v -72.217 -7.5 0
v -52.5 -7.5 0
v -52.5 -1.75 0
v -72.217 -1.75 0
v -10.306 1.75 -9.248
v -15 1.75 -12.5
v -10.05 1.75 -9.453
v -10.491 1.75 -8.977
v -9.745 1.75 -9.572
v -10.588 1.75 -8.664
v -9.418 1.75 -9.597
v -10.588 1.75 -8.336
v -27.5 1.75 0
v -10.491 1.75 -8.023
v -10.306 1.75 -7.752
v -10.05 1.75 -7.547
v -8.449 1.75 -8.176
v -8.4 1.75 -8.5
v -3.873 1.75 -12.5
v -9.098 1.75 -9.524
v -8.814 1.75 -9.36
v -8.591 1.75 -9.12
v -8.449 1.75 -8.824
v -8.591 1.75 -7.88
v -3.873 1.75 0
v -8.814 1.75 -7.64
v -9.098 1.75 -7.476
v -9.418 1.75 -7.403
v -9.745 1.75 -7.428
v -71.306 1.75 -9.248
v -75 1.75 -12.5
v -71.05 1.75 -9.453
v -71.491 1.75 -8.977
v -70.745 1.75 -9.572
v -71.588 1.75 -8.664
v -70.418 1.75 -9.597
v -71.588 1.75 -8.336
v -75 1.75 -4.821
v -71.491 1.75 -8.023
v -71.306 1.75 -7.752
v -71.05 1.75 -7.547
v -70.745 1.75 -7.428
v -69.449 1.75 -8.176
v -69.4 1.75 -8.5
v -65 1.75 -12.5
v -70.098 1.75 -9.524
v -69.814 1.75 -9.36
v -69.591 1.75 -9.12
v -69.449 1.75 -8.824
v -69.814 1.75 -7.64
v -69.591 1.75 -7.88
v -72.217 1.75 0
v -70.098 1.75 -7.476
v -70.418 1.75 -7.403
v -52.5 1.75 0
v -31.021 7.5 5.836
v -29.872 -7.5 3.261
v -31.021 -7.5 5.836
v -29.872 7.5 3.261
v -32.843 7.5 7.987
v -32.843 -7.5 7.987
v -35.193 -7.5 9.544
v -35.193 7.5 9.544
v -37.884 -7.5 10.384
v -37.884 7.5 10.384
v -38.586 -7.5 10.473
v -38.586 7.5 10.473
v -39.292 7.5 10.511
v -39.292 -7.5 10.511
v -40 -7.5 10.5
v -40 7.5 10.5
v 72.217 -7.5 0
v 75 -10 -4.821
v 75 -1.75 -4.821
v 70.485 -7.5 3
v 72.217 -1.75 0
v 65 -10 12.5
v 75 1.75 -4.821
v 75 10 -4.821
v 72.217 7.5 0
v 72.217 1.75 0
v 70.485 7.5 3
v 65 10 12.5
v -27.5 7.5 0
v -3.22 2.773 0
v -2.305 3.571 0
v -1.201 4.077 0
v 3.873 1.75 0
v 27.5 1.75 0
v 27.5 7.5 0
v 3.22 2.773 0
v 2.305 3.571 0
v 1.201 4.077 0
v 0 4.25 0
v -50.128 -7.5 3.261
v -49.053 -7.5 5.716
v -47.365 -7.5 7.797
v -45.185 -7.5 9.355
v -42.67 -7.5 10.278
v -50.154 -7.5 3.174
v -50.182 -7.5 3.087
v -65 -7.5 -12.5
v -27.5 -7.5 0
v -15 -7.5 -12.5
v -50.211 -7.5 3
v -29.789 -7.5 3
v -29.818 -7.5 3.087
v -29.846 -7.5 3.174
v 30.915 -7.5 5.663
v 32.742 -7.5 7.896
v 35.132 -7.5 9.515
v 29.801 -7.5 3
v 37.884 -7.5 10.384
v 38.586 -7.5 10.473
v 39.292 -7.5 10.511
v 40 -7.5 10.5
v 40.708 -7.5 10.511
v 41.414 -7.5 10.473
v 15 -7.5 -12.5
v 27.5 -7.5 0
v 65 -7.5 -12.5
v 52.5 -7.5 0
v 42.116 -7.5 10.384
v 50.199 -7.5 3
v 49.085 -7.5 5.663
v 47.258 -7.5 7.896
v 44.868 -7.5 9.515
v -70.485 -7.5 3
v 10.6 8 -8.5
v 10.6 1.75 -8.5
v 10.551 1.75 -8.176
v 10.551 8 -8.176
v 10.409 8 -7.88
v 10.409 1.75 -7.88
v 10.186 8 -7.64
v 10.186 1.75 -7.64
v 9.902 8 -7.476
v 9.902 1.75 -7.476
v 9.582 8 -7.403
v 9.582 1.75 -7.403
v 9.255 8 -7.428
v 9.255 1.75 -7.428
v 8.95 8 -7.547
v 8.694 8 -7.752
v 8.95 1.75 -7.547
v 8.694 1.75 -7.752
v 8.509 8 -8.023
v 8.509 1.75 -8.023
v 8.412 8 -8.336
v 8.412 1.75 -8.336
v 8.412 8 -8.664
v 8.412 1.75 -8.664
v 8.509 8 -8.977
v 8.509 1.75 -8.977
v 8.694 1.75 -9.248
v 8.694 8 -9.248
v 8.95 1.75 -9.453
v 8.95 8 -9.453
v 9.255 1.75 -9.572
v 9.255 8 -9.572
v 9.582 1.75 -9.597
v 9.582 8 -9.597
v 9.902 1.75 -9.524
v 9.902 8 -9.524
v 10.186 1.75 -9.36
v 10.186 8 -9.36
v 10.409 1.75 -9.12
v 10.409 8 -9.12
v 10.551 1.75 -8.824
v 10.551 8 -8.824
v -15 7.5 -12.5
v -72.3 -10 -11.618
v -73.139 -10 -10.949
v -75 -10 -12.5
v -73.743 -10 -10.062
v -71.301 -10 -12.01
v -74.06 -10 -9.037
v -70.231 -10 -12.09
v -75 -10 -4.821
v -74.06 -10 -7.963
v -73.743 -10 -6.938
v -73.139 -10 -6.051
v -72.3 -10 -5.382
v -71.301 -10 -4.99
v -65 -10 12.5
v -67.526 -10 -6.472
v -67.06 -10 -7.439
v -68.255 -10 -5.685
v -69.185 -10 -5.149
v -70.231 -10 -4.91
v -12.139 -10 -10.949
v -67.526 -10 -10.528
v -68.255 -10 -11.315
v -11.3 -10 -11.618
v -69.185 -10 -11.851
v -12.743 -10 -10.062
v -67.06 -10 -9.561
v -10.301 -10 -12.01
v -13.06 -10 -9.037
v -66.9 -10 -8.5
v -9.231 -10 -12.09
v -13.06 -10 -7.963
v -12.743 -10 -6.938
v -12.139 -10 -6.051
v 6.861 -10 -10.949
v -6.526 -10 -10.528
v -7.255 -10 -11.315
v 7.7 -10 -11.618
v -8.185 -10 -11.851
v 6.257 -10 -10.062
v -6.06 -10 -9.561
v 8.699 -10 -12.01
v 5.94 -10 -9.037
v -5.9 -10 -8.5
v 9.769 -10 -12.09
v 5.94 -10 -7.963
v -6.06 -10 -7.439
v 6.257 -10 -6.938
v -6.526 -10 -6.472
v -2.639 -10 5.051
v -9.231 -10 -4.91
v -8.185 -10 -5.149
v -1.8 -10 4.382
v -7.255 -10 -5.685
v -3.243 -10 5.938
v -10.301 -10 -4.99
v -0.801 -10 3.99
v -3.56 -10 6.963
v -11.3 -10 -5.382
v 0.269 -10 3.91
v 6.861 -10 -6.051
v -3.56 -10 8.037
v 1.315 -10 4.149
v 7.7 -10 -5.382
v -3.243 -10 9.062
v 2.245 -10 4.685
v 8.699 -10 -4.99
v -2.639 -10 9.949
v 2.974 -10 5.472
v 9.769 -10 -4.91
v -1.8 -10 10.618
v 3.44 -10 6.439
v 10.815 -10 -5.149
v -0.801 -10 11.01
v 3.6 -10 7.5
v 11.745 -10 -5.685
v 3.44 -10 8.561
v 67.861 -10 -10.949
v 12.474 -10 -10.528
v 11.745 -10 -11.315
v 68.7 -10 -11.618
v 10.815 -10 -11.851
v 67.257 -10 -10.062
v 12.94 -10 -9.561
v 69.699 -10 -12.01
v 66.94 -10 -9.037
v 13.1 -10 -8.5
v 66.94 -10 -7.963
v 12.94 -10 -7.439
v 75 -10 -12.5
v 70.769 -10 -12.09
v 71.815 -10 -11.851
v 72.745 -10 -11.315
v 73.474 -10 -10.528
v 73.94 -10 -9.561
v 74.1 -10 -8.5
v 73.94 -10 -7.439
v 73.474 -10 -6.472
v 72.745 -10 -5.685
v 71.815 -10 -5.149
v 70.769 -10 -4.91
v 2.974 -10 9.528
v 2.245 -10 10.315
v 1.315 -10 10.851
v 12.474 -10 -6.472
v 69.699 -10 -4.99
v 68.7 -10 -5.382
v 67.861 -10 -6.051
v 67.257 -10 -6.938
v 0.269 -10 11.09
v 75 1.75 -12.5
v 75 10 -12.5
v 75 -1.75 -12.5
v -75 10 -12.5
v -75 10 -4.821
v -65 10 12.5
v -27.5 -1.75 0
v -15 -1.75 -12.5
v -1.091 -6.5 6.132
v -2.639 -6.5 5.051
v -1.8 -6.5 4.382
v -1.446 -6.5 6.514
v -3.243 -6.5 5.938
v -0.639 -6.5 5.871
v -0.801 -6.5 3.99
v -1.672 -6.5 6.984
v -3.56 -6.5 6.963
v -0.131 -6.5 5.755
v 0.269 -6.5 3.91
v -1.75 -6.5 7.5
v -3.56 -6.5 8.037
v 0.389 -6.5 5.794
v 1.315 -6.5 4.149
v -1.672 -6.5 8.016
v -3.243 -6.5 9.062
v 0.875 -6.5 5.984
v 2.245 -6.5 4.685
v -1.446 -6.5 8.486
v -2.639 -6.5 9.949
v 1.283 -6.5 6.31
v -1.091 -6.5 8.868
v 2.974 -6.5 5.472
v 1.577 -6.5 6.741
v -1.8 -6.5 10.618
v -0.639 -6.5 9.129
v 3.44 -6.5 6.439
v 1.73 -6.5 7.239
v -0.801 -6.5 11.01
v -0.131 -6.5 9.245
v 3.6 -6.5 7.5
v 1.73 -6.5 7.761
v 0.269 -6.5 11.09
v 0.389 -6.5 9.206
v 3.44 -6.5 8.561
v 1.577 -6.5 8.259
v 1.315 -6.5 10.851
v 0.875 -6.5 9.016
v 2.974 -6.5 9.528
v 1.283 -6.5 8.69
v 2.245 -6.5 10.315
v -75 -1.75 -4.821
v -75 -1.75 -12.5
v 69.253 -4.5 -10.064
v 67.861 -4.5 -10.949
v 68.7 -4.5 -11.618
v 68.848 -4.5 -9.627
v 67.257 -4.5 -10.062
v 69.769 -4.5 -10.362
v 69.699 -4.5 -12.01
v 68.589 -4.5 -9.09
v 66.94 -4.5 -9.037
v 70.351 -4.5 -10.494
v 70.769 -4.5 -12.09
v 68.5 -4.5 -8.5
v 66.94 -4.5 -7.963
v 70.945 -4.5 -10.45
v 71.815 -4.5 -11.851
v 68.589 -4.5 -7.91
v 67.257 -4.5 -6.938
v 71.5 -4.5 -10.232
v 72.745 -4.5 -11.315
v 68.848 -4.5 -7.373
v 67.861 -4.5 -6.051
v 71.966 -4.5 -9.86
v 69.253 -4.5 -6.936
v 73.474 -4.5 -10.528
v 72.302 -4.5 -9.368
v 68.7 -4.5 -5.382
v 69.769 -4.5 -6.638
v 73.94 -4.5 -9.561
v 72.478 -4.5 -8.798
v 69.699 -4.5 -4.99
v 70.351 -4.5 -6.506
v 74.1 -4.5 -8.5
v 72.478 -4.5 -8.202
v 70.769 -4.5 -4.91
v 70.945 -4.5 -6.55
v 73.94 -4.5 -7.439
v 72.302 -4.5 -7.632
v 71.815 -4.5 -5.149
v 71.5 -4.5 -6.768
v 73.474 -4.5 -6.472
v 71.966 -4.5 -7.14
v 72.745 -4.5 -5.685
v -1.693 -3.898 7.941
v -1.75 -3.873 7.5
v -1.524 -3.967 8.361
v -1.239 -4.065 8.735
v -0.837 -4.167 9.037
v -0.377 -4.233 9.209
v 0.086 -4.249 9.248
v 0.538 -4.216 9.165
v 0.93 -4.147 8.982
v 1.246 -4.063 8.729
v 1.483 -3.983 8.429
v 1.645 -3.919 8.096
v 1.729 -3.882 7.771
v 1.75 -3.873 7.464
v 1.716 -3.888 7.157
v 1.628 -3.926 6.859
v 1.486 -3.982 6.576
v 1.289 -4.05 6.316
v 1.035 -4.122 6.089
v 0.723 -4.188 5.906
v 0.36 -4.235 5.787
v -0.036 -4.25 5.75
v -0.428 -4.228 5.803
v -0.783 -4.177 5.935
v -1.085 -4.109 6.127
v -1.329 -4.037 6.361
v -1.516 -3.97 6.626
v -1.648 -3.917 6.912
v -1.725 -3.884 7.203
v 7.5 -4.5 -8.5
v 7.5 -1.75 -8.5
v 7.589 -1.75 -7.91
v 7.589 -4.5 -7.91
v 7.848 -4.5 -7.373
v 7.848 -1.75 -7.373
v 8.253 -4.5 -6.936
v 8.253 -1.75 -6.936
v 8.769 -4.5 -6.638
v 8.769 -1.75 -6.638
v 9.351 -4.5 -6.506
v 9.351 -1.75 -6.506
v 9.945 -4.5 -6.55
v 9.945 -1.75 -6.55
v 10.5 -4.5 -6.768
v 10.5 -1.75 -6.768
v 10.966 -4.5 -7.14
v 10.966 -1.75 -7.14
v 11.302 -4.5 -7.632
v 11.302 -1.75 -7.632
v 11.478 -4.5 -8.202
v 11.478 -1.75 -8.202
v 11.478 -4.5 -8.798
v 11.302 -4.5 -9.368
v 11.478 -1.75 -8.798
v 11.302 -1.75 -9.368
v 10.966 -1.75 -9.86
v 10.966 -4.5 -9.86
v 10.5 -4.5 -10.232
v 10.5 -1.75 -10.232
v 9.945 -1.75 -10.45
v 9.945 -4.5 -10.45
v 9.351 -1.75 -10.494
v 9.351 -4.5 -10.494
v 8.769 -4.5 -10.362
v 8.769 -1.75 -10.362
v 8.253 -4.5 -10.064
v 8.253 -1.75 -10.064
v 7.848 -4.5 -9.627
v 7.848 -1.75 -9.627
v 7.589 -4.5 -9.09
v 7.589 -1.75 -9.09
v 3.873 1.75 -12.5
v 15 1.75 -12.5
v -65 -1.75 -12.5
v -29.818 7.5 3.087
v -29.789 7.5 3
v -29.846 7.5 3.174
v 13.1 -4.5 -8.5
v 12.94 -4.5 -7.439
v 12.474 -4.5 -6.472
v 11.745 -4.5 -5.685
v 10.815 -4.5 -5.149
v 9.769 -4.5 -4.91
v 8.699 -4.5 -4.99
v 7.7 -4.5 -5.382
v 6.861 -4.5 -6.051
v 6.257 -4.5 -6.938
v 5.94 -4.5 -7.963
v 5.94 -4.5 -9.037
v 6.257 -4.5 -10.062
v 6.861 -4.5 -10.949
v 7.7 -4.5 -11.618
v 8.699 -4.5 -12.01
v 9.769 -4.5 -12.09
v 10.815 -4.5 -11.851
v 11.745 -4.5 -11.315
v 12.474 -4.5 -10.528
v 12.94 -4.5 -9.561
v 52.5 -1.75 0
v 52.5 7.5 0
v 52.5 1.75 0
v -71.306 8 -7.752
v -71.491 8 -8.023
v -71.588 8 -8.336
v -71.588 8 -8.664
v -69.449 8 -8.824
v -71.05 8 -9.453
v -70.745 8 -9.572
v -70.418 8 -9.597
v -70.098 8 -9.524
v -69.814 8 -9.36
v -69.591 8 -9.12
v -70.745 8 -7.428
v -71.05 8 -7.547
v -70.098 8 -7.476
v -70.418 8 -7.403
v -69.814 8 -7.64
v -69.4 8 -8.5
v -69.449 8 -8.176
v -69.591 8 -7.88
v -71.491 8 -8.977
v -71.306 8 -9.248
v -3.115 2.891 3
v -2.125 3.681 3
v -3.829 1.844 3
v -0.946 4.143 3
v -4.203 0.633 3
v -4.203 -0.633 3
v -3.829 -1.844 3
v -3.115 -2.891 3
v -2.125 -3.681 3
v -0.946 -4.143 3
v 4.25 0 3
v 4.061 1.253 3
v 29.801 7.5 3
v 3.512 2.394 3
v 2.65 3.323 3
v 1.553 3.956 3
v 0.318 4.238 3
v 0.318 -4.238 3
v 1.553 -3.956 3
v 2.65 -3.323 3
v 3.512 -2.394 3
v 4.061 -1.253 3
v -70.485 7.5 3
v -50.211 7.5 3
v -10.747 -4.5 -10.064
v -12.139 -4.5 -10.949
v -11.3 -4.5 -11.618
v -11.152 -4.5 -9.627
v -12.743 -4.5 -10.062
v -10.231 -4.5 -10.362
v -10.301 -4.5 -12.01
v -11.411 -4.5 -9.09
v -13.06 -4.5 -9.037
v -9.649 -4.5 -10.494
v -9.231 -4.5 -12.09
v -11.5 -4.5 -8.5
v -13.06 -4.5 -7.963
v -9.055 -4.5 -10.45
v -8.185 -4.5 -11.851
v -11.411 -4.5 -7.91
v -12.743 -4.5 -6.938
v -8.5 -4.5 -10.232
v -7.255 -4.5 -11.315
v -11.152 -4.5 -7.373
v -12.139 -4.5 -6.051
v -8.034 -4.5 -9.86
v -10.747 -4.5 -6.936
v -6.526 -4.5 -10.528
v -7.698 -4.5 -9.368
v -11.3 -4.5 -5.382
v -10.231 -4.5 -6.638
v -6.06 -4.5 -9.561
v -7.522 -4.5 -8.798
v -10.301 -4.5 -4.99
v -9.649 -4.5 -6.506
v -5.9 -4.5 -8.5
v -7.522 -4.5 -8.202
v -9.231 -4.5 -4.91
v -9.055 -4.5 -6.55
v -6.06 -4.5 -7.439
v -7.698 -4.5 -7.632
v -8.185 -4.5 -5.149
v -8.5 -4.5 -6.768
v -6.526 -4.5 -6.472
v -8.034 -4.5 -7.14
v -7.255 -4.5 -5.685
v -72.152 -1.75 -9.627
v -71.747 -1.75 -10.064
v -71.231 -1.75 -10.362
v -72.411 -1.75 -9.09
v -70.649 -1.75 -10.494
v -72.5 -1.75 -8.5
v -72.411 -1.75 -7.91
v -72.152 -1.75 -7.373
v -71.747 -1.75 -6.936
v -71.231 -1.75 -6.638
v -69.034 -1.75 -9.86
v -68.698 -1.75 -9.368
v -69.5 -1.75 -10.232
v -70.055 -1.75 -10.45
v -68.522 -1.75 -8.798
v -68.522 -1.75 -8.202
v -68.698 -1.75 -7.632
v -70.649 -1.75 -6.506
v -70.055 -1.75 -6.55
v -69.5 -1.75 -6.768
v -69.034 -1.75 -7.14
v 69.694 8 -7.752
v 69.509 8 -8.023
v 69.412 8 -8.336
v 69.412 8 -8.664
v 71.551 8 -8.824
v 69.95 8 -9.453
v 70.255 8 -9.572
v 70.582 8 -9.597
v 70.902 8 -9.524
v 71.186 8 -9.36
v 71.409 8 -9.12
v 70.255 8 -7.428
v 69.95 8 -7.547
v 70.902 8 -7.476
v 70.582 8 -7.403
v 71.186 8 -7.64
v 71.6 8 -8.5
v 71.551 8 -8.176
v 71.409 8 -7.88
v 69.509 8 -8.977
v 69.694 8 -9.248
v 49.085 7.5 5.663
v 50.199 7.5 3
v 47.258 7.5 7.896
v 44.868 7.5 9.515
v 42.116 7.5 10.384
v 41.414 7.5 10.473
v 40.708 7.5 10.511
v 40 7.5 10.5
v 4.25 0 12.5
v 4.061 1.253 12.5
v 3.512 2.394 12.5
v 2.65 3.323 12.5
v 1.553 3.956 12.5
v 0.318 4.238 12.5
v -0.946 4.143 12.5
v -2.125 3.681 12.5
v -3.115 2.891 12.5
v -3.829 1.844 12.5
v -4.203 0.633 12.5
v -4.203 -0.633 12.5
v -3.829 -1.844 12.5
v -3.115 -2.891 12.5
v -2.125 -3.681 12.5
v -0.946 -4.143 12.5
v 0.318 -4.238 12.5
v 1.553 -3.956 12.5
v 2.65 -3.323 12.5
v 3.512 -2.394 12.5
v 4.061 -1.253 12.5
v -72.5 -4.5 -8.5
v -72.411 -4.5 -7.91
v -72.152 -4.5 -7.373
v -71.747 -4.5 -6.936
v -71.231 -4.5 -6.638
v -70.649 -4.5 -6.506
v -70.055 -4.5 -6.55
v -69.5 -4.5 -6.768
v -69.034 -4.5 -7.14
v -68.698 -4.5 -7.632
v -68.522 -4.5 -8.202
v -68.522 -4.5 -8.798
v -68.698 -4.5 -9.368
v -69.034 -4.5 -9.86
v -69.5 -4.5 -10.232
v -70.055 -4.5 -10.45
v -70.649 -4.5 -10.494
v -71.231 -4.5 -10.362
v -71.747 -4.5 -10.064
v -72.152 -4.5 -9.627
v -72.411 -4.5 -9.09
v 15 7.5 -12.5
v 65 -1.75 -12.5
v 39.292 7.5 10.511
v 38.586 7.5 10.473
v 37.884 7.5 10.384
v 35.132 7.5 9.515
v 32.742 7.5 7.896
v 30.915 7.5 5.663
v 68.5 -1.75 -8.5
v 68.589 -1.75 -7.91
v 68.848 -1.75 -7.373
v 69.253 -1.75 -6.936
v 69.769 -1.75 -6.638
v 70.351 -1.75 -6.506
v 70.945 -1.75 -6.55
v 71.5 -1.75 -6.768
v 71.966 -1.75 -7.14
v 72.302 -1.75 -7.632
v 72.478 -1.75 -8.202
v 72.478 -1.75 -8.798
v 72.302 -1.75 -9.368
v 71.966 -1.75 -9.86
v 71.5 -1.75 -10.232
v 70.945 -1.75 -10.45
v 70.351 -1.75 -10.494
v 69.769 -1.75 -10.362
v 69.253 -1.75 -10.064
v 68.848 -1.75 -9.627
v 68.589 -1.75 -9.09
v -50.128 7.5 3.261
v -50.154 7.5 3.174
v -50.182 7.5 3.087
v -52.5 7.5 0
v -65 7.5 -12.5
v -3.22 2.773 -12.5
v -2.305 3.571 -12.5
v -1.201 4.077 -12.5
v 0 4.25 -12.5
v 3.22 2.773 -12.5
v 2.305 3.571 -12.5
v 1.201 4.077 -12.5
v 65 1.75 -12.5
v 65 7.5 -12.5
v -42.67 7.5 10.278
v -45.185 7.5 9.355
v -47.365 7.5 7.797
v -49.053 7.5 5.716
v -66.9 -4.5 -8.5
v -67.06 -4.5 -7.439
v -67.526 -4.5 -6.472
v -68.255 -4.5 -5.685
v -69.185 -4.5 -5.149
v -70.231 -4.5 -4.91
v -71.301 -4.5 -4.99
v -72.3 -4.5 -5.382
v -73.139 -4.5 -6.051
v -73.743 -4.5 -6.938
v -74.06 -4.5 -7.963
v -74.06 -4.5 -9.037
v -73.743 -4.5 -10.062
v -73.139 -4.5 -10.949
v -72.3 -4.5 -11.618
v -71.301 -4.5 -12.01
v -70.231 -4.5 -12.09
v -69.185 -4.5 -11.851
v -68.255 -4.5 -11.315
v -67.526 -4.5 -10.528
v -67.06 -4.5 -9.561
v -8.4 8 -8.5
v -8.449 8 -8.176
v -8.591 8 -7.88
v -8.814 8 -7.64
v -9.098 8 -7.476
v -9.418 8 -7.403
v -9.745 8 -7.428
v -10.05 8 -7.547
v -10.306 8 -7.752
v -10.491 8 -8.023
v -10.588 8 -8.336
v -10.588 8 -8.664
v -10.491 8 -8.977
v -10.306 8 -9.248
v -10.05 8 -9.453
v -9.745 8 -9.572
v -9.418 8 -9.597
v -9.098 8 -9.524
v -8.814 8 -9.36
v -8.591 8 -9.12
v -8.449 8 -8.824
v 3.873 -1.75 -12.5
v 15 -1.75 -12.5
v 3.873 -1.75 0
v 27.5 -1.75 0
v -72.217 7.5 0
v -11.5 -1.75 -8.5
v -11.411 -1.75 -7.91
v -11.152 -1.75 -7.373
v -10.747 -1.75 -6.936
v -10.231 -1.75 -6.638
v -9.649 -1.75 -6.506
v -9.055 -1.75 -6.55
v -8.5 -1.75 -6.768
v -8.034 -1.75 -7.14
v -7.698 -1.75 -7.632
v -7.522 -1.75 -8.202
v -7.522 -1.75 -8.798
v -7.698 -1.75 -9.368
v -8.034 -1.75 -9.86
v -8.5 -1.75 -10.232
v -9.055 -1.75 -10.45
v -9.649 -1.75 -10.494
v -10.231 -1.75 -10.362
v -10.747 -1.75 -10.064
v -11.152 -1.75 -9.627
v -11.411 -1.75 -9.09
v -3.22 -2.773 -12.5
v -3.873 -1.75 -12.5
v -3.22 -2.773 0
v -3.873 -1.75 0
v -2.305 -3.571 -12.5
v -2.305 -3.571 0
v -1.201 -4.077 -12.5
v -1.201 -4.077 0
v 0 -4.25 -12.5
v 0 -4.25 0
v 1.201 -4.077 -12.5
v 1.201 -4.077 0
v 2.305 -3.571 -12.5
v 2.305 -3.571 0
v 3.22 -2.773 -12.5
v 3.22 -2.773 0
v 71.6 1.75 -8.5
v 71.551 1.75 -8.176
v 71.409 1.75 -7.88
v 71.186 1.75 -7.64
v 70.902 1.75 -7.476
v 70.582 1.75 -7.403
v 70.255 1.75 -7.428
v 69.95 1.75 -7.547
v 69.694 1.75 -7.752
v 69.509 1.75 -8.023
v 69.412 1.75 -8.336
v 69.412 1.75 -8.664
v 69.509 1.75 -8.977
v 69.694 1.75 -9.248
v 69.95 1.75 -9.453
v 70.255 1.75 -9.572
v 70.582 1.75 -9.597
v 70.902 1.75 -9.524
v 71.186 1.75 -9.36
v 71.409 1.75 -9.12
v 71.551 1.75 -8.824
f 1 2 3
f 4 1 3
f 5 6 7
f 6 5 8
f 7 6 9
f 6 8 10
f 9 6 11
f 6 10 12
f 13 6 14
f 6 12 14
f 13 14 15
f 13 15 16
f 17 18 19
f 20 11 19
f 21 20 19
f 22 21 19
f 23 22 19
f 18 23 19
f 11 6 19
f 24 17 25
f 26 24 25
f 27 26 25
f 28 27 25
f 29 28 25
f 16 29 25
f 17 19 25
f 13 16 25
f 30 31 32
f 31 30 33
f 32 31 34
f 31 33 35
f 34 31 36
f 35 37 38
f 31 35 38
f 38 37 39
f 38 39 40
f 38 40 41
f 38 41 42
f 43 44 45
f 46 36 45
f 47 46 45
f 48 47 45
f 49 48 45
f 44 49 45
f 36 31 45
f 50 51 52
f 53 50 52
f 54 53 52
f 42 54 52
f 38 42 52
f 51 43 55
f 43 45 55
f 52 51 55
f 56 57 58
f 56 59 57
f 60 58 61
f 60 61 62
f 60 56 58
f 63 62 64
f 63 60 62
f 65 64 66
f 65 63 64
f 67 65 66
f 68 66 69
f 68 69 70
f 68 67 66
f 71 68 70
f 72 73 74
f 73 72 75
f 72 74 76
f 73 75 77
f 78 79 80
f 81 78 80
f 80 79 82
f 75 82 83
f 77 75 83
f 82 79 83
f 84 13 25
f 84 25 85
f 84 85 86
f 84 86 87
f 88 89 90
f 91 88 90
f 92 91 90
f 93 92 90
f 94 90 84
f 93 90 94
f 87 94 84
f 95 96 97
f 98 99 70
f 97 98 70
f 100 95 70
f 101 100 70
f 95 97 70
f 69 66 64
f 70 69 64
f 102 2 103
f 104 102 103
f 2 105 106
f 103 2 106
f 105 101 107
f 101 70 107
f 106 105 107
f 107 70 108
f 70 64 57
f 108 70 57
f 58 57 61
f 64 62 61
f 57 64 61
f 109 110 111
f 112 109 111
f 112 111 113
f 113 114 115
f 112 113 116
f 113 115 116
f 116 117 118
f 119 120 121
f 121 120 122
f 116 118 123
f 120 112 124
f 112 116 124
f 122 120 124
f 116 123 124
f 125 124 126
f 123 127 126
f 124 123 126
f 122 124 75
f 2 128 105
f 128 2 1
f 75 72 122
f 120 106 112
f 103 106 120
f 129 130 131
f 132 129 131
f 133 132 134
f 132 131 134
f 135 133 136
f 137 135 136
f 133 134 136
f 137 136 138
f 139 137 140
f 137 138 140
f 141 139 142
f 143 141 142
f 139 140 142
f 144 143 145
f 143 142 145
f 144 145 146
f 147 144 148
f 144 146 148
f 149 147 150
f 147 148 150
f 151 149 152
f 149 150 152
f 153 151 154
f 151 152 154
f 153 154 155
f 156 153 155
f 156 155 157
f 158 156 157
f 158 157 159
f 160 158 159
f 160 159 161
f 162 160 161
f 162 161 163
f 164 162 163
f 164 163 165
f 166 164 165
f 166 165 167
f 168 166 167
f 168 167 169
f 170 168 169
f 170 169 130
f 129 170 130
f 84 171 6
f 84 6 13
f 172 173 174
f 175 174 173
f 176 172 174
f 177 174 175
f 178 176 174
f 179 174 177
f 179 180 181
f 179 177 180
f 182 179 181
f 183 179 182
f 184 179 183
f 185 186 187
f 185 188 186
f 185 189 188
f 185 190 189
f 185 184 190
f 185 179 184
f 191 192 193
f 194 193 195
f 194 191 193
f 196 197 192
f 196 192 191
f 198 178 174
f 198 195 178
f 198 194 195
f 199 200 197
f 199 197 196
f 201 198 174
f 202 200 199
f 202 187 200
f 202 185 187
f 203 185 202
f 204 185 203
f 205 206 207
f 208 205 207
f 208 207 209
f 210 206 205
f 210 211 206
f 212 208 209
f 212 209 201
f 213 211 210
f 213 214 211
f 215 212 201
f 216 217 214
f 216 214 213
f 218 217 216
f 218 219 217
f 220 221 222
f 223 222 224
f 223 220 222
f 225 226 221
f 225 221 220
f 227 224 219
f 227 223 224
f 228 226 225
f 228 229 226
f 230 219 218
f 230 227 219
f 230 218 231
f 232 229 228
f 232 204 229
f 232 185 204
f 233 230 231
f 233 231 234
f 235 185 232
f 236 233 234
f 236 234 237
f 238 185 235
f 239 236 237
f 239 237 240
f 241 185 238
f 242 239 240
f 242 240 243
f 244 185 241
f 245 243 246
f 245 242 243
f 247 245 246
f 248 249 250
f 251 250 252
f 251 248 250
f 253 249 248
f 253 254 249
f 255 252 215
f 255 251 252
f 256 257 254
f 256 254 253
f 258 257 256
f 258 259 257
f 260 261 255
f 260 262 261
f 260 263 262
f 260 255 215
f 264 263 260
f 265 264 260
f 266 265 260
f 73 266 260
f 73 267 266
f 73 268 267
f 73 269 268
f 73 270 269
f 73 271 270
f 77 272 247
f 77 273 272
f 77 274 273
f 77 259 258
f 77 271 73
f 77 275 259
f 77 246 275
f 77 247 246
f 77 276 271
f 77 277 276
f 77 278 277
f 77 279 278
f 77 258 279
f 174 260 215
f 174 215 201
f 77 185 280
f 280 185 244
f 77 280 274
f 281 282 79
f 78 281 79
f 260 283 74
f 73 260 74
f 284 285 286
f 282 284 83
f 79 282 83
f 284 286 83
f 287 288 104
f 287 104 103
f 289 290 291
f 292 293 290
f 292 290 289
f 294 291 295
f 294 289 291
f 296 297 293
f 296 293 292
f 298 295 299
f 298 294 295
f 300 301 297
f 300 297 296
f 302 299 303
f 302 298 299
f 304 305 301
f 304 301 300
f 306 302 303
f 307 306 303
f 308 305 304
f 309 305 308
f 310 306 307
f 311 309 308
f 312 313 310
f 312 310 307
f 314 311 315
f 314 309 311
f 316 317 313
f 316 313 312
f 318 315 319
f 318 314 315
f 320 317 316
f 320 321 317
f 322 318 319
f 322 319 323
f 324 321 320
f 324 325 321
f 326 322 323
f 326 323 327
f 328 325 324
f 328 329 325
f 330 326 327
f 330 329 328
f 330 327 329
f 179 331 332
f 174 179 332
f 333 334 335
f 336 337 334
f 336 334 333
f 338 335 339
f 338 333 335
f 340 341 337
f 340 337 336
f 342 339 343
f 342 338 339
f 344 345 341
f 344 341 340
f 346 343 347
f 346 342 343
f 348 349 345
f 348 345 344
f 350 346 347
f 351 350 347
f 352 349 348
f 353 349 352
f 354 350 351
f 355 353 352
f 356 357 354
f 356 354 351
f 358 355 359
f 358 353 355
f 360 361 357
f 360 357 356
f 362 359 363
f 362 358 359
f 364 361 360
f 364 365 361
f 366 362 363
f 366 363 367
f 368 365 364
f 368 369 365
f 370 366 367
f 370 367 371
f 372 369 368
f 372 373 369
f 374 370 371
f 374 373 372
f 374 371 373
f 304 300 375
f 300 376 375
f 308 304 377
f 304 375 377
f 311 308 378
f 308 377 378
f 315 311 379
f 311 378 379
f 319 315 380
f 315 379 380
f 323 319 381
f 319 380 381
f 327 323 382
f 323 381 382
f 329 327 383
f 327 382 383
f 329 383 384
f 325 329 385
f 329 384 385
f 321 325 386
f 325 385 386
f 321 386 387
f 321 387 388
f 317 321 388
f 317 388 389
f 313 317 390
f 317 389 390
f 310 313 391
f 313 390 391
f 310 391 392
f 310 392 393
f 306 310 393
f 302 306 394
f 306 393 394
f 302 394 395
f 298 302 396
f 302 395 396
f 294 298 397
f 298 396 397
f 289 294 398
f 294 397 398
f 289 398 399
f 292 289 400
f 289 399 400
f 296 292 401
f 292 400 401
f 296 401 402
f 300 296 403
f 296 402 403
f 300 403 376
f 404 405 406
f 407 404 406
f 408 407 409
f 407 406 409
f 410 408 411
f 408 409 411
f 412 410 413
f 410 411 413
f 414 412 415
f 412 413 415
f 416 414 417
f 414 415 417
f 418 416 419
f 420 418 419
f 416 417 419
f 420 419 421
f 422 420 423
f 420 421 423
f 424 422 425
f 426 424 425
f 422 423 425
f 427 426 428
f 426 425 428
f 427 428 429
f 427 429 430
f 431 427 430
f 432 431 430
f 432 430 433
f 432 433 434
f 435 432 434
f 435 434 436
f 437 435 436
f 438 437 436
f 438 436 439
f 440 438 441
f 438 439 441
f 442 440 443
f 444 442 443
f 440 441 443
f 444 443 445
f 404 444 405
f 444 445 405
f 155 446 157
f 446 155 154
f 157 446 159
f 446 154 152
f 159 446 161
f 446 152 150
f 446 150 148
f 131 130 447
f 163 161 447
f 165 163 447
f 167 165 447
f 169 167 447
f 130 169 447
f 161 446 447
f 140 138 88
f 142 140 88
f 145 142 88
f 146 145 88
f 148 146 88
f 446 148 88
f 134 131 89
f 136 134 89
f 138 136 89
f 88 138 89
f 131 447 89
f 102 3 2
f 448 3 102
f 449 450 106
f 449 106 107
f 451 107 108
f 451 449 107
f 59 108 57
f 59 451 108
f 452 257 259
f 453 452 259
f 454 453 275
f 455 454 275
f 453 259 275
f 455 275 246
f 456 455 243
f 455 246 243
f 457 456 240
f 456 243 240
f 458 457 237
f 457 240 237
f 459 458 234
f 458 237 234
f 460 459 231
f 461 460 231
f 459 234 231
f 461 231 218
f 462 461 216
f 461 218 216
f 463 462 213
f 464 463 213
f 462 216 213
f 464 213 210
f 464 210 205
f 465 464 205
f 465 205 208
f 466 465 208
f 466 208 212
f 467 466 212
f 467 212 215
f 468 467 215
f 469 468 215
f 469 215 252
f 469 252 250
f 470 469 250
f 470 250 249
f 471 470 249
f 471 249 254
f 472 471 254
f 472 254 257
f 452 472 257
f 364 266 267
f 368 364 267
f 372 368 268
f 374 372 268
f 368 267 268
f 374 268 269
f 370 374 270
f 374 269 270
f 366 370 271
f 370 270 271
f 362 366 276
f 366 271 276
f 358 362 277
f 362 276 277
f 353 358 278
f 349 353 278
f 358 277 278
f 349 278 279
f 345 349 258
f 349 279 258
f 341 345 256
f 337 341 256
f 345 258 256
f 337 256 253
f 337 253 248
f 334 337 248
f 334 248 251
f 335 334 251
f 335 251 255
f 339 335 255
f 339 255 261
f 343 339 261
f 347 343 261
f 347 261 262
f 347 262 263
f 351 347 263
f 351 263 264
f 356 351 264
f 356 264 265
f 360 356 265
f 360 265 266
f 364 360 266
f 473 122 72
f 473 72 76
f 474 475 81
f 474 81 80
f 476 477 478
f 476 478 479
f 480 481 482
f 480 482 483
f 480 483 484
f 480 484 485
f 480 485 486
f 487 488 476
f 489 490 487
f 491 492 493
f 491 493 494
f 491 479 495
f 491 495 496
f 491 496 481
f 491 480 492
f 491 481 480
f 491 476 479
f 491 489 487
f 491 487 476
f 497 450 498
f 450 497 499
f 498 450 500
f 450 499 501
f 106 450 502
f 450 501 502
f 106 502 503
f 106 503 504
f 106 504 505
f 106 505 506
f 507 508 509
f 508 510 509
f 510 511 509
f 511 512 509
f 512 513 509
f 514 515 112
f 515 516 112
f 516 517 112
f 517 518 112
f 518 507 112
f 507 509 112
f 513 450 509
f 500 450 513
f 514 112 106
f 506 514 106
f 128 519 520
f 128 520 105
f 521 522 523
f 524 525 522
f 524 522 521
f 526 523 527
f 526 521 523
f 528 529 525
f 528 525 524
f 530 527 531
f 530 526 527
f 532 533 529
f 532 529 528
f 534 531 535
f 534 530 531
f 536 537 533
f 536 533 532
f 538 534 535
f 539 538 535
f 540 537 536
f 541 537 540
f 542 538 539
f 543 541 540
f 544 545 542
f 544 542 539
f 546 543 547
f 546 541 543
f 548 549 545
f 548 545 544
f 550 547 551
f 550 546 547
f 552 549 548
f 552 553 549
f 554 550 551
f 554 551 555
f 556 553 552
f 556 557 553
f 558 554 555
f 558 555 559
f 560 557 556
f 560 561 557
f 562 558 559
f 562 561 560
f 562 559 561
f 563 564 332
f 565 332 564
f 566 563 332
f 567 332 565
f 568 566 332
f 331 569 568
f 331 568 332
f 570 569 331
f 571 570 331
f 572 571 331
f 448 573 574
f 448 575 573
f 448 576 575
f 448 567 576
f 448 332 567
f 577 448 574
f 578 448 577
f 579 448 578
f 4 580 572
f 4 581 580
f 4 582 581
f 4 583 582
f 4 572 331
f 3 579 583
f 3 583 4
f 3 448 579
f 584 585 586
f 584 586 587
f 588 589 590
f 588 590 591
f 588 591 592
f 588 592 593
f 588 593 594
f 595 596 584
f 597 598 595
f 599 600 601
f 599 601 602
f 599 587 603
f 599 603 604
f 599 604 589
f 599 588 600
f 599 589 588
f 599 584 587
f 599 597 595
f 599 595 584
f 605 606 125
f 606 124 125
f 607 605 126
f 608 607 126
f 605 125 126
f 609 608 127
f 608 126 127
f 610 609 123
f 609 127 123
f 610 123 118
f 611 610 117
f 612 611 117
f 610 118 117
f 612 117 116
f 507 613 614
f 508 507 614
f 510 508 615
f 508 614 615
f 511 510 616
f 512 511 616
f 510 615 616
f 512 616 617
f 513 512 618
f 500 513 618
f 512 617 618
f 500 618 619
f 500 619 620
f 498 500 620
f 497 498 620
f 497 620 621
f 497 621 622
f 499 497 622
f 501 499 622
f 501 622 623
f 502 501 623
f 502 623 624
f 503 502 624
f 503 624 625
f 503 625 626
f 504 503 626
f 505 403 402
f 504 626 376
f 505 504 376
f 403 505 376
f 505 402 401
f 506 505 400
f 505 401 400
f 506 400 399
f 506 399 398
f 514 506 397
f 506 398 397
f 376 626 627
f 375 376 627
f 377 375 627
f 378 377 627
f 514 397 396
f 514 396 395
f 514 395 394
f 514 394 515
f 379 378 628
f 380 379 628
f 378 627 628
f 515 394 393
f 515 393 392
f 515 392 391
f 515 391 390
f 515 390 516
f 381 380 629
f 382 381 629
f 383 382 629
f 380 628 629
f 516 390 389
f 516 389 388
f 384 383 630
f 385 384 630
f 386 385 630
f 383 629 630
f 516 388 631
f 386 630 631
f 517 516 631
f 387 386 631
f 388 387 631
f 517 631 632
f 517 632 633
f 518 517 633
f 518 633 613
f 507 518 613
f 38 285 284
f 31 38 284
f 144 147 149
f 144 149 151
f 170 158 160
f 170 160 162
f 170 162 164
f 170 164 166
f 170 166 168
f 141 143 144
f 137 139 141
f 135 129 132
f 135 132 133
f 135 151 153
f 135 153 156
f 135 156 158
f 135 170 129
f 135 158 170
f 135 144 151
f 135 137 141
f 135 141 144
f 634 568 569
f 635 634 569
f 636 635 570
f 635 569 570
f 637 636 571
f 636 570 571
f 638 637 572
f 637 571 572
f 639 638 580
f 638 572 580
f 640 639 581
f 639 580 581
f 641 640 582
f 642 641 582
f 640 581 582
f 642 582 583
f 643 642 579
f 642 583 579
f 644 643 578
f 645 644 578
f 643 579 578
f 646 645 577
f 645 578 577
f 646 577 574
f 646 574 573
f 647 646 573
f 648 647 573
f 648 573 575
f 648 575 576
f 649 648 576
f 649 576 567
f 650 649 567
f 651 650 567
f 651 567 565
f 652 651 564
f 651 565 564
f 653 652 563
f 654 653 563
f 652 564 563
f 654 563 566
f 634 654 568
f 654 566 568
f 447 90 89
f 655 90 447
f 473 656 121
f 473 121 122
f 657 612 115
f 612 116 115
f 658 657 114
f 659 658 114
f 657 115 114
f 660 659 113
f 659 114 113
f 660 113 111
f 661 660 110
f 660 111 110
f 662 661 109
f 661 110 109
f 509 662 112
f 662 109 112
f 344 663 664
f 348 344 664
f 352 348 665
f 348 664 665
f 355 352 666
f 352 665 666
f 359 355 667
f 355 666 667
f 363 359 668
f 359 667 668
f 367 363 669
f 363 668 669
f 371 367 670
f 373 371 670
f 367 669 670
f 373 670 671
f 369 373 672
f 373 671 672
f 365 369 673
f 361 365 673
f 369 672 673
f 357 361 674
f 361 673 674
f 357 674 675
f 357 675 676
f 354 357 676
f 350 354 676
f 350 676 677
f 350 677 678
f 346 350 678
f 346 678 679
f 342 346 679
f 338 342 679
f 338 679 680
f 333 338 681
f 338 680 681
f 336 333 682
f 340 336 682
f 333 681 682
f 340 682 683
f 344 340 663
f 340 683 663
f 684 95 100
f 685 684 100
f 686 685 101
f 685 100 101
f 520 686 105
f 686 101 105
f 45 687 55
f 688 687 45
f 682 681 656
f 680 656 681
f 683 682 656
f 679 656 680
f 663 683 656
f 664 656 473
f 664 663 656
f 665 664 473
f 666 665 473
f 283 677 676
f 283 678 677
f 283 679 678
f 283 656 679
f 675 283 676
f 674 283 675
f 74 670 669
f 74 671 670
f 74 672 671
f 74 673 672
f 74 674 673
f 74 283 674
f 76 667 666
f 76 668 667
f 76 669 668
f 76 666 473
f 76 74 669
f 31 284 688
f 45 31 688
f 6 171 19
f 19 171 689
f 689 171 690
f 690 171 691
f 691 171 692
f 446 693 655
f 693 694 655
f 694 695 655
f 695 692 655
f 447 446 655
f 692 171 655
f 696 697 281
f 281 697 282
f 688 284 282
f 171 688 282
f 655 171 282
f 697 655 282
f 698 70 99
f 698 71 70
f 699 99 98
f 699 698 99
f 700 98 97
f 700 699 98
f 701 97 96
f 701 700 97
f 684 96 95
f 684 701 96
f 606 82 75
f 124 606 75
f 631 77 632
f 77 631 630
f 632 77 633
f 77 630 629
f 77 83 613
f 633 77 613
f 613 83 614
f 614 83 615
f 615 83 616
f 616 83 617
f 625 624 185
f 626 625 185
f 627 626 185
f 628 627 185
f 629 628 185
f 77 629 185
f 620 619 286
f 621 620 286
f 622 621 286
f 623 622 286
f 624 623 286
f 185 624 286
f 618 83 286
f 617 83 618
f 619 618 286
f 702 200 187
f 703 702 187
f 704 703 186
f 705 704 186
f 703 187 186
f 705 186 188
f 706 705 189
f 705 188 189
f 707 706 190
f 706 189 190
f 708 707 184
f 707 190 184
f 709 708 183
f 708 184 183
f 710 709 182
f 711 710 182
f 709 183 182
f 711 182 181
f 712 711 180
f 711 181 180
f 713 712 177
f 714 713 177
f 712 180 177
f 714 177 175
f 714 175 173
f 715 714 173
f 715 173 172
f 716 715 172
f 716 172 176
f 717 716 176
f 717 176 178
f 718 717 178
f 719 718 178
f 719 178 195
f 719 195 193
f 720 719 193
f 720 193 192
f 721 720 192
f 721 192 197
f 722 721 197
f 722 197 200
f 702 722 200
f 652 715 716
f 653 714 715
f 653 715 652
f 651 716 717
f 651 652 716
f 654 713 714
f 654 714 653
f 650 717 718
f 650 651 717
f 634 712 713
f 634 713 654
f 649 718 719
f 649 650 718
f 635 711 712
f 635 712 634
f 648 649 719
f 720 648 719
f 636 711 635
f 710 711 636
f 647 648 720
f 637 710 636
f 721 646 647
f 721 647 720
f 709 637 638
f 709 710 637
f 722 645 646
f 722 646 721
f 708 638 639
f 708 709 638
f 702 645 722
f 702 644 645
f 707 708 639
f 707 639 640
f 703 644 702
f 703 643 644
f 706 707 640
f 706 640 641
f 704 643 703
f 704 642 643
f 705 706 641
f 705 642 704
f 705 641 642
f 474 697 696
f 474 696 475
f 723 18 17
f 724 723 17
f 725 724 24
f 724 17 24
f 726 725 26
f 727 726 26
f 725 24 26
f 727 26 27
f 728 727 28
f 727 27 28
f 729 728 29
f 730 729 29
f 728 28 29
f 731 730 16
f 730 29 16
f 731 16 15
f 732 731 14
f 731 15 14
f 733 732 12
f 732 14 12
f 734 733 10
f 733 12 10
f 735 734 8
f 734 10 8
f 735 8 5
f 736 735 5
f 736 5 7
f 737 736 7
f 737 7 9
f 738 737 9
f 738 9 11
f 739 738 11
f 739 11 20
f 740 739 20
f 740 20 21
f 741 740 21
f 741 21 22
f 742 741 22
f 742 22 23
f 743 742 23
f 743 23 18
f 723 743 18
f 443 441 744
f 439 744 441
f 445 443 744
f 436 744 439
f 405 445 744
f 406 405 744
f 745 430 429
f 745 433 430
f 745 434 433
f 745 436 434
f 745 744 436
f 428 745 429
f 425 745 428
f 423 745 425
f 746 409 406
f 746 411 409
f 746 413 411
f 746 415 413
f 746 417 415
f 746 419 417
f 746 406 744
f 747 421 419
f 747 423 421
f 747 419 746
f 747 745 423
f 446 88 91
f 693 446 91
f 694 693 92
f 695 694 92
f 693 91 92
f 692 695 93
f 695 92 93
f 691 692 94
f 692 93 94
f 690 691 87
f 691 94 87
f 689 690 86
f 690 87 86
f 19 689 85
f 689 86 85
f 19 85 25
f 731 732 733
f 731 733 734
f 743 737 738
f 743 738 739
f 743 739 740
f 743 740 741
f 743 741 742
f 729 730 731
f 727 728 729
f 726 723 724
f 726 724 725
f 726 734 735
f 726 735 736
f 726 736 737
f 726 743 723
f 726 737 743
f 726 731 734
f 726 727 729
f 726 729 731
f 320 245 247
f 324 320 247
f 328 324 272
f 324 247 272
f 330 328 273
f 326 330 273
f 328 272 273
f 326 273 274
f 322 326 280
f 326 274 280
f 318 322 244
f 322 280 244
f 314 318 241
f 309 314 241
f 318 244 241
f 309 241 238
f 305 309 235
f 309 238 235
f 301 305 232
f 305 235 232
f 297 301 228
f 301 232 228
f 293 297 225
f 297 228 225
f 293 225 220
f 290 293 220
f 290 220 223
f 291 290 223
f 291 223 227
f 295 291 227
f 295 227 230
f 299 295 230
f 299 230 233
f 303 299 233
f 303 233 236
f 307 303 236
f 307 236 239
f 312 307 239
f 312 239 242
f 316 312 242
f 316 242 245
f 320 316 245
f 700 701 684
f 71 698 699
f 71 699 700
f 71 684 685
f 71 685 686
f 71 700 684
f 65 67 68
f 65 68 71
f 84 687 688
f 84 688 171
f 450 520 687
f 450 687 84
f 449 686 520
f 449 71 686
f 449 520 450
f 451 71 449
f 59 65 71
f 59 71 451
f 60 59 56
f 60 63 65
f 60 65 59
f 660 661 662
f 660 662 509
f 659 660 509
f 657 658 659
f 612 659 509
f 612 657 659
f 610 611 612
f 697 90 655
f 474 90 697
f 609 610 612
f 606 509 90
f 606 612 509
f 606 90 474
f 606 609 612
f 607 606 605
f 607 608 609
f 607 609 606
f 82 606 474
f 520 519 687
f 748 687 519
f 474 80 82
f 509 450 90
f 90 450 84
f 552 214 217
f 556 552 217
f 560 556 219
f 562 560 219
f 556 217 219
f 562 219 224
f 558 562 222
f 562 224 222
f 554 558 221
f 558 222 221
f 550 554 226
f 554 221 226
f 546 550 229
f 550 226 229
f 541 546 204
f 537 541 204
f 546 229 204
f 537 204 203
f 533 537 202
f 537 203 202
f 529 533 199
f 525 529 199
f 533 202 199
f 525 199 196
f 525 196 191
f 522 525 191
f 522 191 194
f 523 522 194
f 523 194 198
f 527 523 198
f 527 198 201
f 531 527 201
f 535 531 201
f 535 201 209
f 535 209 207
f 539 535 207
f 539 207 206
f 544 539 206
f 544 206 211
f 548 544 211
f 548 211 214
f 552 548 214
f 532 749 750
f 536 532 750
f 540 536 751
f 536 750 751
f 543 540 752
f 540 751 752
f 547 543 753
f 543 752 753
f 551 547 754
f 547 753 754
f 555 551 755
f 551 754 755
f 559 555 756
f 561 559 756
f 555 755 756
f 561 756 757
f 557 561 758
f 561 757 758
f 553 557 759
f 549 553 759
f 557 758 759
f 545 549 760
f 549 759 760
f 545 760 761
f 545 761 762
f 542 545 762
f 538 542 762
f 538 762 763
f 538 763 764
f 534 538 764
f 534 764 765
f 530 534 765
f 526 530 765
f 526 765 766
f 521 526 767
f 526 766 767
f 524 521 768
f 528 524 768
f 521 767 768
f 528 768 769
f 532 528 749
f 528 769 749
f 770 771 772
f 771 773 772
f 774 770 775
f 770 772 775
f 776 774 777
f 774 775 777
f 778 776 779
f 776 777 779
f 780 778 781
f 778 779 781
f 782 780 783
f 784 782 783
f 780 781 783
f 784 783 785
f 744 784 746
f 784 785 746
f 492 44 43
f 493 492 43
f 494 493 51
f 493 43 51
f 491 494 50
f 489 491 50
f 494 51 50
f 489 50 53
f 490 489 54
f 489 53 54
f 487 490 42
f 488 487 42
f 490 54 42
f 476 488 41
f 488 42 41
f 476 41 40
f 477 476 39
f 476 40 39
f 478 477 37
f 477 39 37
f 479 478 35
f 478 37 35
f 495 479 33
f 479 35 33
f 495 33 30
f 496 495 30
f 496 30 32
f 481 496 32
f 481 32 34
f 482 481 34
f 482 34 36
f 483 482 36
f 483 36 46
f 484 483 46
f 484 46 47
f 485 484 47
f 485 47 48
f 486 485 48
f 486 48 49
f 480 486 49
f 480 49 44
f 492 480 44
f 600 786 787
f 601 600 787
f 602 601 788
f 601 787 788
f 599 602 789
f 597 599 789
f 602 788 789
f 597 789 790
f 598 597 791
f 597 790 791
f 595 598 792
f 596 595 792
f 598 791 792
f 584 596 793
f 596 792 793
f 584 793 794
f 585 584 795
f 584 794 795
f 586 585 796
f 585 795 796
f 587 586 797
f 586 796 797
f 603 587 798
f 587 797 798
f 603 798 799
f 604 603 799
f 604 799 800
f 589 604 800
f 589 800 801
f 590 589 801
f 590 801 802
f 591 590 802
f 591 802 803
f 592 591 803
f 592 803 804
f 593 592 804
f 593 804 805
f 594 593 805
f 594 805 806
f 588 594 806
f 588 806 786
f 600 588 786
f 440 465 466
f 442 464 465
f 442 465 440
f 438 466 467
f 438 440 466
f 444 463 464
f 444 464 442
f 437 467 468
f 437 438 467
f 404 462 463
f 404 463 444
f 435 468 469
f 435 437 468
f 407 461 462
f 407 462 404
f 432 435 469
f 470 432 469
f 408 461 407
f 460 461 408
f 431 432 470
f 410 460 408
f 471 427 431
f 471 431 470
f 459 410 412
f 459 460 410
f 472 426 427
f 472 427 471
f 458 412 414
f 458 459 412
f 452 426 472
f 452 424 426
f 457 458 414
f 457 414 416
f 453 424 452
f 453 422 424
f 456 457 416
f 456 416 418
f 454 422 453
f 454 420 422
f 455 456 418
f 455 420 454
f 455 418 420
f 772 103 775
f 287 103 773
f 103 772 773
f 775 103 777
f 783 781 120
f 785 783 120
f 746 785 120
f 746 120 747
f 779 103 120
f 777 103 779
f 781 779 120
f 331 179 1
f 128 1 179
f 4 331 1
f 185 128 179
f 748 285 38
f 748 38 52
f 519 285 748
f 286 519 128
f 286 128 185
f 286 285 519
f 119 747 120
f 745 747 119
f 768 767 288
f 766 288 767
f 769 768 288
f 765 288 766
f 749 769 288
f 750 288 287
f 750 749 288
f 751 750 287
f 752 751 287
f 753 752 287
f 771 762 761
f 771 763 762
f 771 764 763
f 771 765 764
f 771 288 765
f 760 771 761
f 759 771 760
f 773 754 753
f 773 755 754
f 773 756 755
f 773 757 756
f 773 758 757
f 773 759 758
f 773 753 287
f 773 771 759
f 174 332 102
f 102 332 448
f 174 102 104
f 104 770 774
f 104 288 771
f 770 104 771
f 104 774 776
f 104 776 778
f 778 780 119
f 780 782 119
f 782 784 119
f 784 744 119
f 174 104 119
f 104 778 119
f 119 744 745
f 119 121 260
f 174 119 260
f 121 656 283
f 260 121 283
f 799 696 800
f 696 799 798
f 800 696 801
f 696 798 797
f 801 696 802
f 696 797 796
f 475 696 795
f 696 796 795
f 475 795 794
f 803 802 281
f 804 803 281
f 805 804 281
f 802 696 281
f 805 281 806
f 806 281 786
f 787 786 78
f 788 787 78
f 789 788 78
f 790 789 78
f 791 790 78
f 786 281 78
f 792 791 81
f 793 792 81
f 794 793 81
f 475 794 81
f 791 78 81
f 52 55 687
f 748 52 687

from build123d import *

# Parameters (mm, degrees)
F1_DEPTH       = 10
F3_DEPTH       = 7.5
F5_R           = 4.25
F6_DEPTH       = 30
F8_D           = 4
F8_DEPTH       = 8.5
F8_CBORE_D     = 7.2
F8_CBORE_DEPTH = 5.5
F8_TIP         = 1.2017212381
F9_D           = 3.5
F9_DEPTH       = 7
F9_CBORE_D     = 7.2
F9_CBORE_DEPTH = 3.5
F9_TIP         = 1.0515060833
F10_R          = 5
F11_R          = 5
F12_W          = 3.5
F12_H          = 12.5
F13_DEPTH      = 150.001
F7_R           = 1.1
F14_DEPTH      = 18
F15_T1_DEPTH   = 109.6192794117
F16_T1_DEPTH   = 109.6192794117


# Not quite as in the source:
# - a fillet or chamfer that OpenCascade refuses, or shapes differently, is made with other operations: its cross-section is extruded or revolved along the edge and cut away or added


with BuildPart() as f1:
    # F0 (on Front) → F1 (new body)
    with BuildSketch(Plane.XZ):
        Polygon((75, 12.5), (-75, 12.5), (-75, -12.5), (-50.5, -12.5), (75, -12.5), align=None)
    extrude(amount=-F1_DEPTH)

    # F2 (on face) → F3 (cut)
    with BuildSketch(Plane.XZ):
        with BuildLine():
            Line((-50.5, 0), (-50.5, -12.5))
            Line((-50.5, -12.5), (-29.5, -12.5))
            Line((-29.5, -12.5), (-29.5, 0))
            ThreePointArc((-29.5, 0), (-29.5018489924, 1.0611519764), (-29.616133488, 2.116133488))
            ThreePointArc((-29.616133488, 2.116133488), (-32.4157560185, 7.5842439815), (-37.883866512, 10.383866512))
            ThreePointArc((-37.883866512, 10.383866512), (-38.9388480236, 10.4981510076), (-40, 10.5))
            ThreePointArc((-40, 10.5), (-46.7951402173, 8.2937242033), (-50.383866512, 2.116133488))
            ThreePointArc((-50.383866512, 2.116133488), (-50.4981510076, 1.0611519764), (-50.5, 0))
        make_face()
        with BuildLine():
            ThreePointArc((29.616133488, 2.116133488), (29.5018489924, 1.0611519764), (29.5, 0))
            Line((29.5, 0), (29.5, -12.5))
            Line((29.5, -12.5), (50.5, -12.5))
            Line((50.5, -12.5), (50.5, 0))
            ThreePointArc((50.5, 0), (50.4981510076, 1.0611519764), (50.383866512, 2.116133488))
            ThreePointArc((50.383866512, 2.116133488), (47.5842439815, 7.5842439815), (42.116133488, 10.383866512))
            ThreePointArc((42.116133488, 10.383866512), (41.0611519764, 10.4981510076), (40, 10.5))
            ThreePointArc((40, 10.5), (38.9388480236, 10.4981510076), (37.883866512, 10.383866512))
            ThreePointArc((37.883866512, 10.383866512), (32.4157560185, 7.5842439815), (29.616133488, 2.116133488))
        make_face()
        with BuildLine():
            Line((-65, -12.5), (-59.4149563834, -12.5))
            Line((-59.4149563834, -12.5), (-50.5, -12.5))
            Line((-50.5, -12.5), (-50.5, 0))
            ThreePointArc((-50.5, 0), (-50.4981510076, 1.0611519764), (-50.383866512, 2.116133488))
            Line((-50.383866512, 2.116133488), (-65, -12.5))
        make_face()
        Polygon((-29.5, 0), (-29.5, -12.5), (-15, -12.5), (-27.5, 0), align=None)
        with BuildLine():
            ThreePointArc((-29.616133488, 2.116133488), (-29.5018489924, 1.0611519764), (-29.5, 0))
            Line((-29.5, 0), (-27.5, 0))
            Line((-27.5, 0), (-29.616133488, 2.116133488))
        make_face()
        Polygon((27.5, 0), (15, -12.5), (17, -12.5), (19.8756534234, -12.5), (29.5, -12.5), (29.5, 0), align=None)
        with BuildLine():
            Line((29.616133488, 2.116133488), (27.5, 0))
            Line((27.5, 0), (29.5, 0))
            ThreePointArc((29.5, 0), (29.5018489924, 1.0611519764), (29.616133488, 2.116133488))
        make_face()
        with BuildLine():
            Line((50.5, 0), (52.5, 0))
            Line((52.5, 0), (50.383866512, 2.116133488))
            ThreePointArc((50.383866512, 2.116133488), (50.4981510076, 1.0611519764), (50.5, 0))
        make_face()
        Polygon((62.5, -10.8300764114), (62.5, -10), (52.5, 0), (50.5, 0), (50.5, -12.5), (62.5, -12.5), align=None)
        Polygon((62.5, -12.5), (65, -12.5), (62.5, -10), (62.5, -10.8300764114), align=None)
    extrude(amount=-F3_DEPTH, mode=Mode.SUBTRACT)

    # F4: F1 across face


with BuildPart() as f1_1:
    add(f1.part)
    add(f1.part.mirror(Plane.XZ))

    # F5 (on face) → F6 (cut)
    with BuildSketch(Plane.XY.offset(12.5)):
        Circle(F5_R)
    extrude(amount=-F6_DEPTH, mode=Mode.SUBTRACT)

    # F8
    with Locations(Plane.XZ.offset(10)):
        with Locations((-70.5, -8.5), (-9.5, -8.5), (9.5, -8.5), (70.5, -8.5)):
            CounterBoreHole(F8_D / 2, F8_CBORE_D / 2, F8_CBORE_DEPTH, depth=F8_DEPTH)
            with Locations((0, 0, -(F8_DEPTH + F8_TIP / 2))):  # 118° drill point
                Cone(0, F8_D / 2, F8_TIP, mode=Mode.SUBTRACT)

    # F9
    with Locations(Plane.XZ.offset(10)):
        with Locations((0, 7.5)):
            CounterBoreHole(F9_D / 2, F9_CBORE_D / 2, F9_CBORE_DEPTH, depth=F9_DEPTH)
            with Locations((0, 0, -(F9_DEPTH + F9_TIP / 2))):  # 118° drill point
                Cone(0, F9_D / 2, F9_TIP, mode=Mode.SUBTRACT)

    # F10
    f10_edges = [f1_1.edges().sort_by_distance(p)[0] for p in [
        (-29.616133, 0, 2.116133),
    ]]
    fillet(f10_edges, radius=F10_R)

    # F11
    f11_edges = [f1_1.edges().sort_by_distance(p)[0] for p in [
        (-50.383867, 0, 2.116133),
    ]]
    fillet(f11_edges, radius=F11_R)

    # F12 (on face) → F13 (cut, through all)
    with BuildSketch(Plane.YZ.offset(75)):
        with Locations((0, -6.25)):
            Rectangle(F12_W, F12_H)
        Polygon((-7.5, 0), (-1.75, 0), (1.75, 0), (7.5, 0), (7.5, 3), (-7.5, 3), align=None)
    extrude(amount=-F13_DEPTH, mode=Mode.SUBTRACT)

    # F7 (on face) → F14 (cut)
    with BuildSketch(Plane.XZ.offset(10)):
        with Locations((-70.5, -8.5)):
            Circle(F7_R)
        with Locations((-9.5, -8.5)):
            Circle(F7_R)
        with Locations((9.5, -8.5)):
            Circle(F7_R)
        with Locations((70.5, -8.5)):
            Circle(F7_R)
    extrude(amount=-F14_DEPTH, mode=Mode.SUBTRACT)

    # F15: chamfer of 10 x 17.3205080757 on 1 edges, made by hand

    # F15_s2 → F15_t1 (cut)
    with BuildSketch(Plane.XZ.offset(-54.8096397058)):
        Polygon((-75, -4.8205080757), (-65, 12.5), (-75, 12.5), align=None)
    extrude(amount=F15_T1_DEPTH, mode=Mode.SUBTRACT)

    # F16: chamfer of 10 x 17.3205080757 on 1 edges, made by hand

    # F16_s2 → F16_t1 (cut)
    with BuildSketch(Plane.XZ.offset(-54.8096397058)):
        Polygon((75, -4.8205080757), (65, 12.5), (75, 12.5), align=None)
    extrude(amount=F16_T1_DEPTH, mode=Mode.SUBTRACT)


solid = f1_1.part
